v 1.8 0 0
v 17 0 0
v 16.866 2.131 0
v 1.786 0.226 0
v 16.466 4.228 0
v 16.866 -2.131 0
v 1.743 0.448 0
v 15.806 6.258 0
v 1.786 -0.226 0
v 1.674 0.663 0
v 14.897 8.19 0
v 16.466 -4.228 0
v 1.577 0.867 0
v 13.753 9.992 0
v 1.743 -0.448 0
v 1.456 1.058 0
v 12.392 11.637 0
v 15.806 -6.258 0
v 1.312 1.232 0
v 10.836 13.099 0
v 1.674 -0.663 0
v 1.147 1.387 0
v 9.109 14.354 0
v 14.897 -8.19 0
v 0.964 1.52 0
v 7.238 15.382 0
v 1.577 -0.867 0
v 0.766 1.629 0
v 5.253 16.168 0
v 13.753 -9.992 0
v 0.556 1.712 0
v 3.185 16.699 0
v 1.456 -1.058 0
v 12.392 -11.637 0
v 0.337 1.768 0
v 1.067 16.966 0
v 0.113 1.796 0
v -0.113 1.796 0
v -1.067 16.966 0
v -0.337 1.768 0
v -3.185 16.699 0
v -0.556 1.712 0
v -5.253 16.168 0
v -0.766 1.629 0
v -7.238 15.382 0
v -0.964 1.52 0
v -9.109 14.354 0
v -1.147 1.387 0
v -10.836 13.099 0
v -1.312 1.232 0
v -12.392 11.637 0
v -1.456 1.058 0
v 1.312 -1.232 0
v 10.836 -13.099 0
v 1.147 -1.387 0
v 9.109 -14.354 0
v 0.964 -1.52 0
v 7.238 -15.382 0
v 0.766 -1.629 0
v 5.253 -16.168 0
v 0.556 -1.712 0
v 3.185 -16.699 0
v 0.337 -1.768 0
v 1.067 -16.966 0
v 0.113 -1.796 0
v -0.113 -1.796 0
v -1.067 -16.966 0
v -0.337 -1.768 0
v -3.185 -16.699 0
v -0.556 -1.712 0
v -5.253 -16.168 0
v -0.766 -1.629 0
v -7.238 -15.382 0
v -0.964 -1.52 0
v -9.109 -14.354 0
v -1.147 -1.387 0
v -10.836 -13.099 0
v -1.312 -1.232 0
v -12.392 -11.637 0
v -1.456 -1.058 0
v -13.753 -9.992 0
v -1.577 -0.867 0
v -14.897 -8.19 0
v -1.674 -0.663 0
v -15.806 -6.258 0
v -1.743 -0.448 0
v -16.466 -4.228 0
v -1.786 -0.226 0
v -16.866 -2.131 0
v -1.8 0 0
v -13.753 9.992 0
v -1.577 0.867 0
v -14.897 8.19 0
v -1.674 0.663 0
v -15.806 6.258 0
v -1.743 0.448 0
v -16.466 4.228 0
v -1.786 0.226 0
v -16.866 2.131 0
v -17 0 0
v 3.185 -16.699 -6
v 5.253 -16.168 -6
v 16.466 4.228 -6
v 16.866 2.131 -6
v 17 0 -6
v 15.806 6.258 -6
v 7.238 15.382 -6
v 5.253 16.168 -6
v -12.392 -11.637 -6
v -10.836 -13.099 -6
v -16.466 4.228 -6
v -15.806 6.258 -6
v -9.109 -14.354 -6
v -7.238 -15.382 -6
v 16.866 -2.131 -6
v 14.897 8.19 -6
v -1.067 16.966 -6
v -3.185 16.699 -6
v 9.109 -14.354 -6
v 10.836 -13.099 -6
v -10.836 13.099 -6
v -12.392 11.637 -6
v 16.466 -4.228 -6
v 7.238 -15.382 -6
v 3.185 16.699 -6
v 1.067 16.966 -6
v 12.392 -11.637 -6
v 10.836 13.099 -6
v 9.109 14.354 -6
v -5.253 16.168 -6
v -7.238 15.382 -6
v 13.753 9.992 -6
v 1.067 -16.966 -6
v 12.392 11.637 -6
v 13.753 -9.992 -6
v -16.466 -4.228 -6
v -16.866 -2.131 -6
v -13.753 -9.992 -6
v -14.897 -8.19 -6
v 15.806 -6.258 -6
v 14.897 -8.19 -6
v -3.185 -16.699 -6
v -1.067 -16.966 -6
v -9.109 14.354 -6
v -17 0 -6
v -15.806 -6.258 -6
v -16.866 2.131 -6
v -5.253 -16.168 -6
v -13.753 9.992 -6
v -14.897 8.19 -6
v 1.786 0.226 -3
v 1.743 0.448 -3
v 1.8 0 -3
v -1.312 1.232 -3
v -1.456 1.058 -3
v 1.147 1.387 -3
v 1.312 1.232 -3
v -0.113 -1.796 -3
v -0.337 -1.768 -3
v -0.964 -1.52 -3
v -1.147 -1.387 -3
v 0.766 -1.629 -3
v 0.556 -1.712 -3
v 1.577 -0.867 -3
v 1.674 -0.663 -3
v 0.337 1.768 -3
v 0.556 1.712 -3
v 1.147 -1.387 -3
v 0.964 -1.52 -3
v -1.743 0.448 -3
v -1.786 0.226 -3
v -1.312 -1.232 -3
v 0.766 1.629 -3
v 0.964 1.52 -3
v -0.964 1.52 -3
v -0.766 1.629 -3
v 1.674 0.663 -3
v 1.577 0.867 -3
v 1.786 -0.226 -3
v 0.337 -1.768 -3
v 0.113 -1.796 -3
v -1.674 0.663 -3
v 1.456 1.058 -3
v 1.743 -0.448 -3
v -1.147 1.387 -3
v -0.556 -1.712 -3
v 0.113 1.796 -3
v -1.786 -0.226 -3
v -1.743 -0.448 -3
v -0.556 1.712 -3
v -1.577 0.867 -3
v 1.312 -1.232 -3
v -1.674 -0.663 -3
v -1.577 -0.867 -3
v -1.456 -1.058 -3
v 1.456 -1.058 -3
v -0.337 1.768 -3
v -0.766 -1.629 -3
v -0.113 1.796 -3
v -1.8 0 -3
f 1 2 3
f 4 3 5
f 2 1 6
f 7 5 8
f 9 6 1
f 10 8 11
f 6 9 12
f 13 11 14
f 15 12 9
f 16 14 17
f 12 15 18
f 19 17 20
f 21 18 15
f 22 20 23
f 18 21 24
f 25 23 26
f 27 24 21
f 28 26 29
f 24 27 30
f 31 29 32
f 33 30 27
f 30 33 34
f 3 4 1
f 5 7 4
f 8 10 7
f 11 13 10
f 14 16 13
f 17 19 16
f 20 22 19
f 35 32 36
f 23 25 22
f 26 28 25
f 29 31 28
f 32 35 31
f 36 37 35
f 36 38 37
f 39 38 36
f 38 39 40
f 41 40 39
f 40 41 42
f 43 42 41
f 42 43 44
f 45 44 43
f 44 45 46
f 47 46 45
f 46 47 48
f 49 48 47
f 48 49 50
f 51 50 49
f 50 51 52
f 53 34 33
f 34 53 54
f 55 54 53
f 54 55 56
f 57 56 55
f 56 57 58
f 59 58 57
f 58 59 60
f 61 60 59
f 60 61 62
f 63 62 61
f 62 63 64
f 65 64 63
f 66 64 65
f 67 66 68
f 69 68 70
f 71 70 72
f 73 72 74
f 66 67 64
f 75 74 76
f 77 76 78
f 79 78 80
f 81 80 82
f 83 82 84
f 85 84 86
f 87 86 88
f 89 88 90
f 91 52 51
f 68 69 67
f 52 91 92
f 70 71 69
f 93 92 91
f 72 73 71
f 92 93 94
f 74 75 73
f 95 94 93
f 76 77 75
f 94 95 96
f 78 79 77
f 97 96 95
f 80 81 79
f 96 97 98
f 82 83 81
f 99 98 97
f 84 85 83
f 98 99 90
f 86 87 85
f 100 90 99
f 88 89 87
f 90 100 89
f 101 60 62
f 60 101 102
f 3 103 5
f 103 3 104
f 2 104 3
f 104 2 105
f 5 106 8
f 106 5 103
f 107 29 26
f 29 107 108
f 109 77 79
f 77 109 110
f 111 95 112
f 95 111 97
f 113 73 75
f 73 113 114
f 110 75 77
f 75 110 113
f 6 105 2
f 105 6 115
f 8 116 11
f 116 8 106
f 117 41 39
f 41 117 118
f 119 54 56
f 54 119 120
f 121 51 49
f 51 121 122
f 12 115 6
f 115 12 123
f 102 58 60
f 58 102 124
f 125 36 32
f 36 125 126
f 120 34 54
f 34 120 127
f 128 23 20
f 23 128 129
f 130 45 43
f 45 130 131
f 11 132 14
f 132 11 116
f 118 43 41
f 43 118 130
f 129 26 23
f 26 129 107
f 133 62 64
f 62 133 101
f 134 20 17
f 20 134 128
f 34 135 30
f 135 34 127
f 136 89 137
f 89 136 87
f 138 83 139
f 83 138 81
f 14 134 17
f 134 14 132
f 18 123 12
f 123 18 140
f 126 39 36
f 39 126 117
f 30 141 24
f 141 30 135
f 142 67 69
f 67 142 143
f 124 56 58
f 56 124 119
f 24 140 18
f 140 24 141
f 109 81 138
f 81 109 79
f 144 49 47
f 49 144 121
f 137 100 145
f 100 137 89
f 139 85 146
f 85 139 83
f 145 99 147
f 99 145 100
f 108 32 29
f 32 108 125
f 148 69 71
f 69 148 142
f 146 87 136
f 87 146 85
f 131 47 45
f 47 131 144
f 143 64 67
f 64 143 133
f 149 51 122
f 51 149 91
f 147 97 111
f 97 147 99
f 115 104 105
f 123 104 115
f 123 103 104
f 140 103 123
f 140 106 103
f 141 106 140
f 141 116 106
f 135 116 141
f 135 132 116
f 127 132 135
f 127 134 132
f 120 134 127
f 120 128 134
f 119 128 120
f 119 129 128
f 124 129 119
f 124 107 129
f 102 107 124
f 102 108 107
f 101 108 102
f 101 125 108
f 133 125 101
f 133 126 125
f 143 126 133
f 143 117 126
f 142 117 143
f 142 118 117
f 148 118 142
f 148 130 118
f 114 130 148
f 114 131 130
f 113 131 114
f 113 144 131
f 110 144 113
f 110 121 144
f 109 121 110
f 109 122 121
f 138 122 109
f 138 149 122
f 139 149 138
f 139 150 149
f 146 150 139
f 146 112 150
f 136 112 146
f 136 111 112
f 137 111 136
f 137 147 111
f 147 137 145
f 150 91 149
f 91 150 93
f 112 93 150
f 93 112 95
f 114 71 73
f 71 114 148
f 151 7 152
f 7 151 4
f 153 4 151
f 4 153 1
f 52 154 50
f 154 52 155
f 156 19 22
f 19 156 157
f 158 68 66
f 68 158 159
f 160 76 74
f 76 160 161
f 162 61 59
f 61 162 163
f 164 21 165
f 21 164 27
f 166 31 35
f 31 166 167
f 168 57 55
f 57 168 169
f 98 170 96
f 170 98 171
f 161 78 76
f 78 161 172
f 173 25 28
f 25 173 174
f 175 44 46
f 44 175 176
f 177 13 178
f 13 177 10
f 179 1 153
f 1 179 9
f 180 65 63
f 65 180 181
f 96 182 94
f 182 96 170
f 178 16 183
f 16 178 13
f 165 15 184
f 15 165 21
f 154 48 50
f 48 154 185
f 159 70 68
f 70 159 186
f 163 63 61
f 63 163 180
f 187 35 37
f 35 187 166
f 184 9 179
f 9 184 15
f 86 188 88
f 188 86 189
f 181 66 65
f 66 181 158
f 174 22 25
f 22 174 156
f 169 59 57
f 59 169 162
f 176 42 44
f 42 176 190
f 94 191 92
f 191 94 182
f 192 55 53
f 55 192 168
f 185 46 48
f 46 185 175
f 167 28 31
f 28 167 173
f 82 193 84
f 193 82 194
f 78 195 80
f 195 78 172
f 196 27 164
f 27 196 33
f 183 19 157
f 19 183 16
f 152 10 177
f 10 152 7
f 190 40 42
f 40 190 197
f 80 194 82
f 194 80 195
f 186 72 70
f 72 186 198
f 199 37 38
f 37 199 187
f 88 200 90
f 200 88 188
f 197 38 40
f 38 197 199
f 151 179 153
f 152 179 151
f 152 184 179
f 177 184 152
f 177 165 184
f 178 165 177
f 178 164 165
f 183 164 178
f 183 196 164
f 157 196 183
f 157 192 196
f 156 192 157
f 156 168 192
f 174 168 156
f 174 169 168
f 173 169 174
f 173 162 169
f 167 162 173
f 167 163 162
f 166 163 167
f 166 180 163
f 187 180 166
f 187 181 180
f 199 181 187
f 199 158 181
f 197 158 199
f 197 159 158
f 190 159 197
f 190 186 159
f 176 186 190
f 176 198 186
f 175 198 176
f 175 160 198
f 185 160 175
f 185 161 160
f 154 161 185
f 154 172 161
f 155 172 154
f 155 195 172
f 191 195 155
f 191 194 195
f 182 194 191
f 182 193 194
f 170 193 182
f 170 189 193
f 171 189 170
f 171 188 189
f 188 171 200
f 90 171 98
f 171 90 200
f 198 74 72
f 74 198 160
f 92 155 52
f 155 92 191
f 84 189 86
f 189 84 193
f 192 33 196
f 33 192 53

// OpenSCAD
$fn = 50;


difference() {
	union() {
		translate(v = [0, 0, -3.0000000000]) {
			cylinder(h = 3, r = 7.0000000000);
		}
		translate(v = [0, 0, -6.0000000000]) {
			cylinder(h = 6, r = 17.0000000000);
		}
	}
	union() {
		#translate(v = [0, 0, -3]) {
			cylinder(h = 3, r = 1.8000000000);
		}
	}
}
